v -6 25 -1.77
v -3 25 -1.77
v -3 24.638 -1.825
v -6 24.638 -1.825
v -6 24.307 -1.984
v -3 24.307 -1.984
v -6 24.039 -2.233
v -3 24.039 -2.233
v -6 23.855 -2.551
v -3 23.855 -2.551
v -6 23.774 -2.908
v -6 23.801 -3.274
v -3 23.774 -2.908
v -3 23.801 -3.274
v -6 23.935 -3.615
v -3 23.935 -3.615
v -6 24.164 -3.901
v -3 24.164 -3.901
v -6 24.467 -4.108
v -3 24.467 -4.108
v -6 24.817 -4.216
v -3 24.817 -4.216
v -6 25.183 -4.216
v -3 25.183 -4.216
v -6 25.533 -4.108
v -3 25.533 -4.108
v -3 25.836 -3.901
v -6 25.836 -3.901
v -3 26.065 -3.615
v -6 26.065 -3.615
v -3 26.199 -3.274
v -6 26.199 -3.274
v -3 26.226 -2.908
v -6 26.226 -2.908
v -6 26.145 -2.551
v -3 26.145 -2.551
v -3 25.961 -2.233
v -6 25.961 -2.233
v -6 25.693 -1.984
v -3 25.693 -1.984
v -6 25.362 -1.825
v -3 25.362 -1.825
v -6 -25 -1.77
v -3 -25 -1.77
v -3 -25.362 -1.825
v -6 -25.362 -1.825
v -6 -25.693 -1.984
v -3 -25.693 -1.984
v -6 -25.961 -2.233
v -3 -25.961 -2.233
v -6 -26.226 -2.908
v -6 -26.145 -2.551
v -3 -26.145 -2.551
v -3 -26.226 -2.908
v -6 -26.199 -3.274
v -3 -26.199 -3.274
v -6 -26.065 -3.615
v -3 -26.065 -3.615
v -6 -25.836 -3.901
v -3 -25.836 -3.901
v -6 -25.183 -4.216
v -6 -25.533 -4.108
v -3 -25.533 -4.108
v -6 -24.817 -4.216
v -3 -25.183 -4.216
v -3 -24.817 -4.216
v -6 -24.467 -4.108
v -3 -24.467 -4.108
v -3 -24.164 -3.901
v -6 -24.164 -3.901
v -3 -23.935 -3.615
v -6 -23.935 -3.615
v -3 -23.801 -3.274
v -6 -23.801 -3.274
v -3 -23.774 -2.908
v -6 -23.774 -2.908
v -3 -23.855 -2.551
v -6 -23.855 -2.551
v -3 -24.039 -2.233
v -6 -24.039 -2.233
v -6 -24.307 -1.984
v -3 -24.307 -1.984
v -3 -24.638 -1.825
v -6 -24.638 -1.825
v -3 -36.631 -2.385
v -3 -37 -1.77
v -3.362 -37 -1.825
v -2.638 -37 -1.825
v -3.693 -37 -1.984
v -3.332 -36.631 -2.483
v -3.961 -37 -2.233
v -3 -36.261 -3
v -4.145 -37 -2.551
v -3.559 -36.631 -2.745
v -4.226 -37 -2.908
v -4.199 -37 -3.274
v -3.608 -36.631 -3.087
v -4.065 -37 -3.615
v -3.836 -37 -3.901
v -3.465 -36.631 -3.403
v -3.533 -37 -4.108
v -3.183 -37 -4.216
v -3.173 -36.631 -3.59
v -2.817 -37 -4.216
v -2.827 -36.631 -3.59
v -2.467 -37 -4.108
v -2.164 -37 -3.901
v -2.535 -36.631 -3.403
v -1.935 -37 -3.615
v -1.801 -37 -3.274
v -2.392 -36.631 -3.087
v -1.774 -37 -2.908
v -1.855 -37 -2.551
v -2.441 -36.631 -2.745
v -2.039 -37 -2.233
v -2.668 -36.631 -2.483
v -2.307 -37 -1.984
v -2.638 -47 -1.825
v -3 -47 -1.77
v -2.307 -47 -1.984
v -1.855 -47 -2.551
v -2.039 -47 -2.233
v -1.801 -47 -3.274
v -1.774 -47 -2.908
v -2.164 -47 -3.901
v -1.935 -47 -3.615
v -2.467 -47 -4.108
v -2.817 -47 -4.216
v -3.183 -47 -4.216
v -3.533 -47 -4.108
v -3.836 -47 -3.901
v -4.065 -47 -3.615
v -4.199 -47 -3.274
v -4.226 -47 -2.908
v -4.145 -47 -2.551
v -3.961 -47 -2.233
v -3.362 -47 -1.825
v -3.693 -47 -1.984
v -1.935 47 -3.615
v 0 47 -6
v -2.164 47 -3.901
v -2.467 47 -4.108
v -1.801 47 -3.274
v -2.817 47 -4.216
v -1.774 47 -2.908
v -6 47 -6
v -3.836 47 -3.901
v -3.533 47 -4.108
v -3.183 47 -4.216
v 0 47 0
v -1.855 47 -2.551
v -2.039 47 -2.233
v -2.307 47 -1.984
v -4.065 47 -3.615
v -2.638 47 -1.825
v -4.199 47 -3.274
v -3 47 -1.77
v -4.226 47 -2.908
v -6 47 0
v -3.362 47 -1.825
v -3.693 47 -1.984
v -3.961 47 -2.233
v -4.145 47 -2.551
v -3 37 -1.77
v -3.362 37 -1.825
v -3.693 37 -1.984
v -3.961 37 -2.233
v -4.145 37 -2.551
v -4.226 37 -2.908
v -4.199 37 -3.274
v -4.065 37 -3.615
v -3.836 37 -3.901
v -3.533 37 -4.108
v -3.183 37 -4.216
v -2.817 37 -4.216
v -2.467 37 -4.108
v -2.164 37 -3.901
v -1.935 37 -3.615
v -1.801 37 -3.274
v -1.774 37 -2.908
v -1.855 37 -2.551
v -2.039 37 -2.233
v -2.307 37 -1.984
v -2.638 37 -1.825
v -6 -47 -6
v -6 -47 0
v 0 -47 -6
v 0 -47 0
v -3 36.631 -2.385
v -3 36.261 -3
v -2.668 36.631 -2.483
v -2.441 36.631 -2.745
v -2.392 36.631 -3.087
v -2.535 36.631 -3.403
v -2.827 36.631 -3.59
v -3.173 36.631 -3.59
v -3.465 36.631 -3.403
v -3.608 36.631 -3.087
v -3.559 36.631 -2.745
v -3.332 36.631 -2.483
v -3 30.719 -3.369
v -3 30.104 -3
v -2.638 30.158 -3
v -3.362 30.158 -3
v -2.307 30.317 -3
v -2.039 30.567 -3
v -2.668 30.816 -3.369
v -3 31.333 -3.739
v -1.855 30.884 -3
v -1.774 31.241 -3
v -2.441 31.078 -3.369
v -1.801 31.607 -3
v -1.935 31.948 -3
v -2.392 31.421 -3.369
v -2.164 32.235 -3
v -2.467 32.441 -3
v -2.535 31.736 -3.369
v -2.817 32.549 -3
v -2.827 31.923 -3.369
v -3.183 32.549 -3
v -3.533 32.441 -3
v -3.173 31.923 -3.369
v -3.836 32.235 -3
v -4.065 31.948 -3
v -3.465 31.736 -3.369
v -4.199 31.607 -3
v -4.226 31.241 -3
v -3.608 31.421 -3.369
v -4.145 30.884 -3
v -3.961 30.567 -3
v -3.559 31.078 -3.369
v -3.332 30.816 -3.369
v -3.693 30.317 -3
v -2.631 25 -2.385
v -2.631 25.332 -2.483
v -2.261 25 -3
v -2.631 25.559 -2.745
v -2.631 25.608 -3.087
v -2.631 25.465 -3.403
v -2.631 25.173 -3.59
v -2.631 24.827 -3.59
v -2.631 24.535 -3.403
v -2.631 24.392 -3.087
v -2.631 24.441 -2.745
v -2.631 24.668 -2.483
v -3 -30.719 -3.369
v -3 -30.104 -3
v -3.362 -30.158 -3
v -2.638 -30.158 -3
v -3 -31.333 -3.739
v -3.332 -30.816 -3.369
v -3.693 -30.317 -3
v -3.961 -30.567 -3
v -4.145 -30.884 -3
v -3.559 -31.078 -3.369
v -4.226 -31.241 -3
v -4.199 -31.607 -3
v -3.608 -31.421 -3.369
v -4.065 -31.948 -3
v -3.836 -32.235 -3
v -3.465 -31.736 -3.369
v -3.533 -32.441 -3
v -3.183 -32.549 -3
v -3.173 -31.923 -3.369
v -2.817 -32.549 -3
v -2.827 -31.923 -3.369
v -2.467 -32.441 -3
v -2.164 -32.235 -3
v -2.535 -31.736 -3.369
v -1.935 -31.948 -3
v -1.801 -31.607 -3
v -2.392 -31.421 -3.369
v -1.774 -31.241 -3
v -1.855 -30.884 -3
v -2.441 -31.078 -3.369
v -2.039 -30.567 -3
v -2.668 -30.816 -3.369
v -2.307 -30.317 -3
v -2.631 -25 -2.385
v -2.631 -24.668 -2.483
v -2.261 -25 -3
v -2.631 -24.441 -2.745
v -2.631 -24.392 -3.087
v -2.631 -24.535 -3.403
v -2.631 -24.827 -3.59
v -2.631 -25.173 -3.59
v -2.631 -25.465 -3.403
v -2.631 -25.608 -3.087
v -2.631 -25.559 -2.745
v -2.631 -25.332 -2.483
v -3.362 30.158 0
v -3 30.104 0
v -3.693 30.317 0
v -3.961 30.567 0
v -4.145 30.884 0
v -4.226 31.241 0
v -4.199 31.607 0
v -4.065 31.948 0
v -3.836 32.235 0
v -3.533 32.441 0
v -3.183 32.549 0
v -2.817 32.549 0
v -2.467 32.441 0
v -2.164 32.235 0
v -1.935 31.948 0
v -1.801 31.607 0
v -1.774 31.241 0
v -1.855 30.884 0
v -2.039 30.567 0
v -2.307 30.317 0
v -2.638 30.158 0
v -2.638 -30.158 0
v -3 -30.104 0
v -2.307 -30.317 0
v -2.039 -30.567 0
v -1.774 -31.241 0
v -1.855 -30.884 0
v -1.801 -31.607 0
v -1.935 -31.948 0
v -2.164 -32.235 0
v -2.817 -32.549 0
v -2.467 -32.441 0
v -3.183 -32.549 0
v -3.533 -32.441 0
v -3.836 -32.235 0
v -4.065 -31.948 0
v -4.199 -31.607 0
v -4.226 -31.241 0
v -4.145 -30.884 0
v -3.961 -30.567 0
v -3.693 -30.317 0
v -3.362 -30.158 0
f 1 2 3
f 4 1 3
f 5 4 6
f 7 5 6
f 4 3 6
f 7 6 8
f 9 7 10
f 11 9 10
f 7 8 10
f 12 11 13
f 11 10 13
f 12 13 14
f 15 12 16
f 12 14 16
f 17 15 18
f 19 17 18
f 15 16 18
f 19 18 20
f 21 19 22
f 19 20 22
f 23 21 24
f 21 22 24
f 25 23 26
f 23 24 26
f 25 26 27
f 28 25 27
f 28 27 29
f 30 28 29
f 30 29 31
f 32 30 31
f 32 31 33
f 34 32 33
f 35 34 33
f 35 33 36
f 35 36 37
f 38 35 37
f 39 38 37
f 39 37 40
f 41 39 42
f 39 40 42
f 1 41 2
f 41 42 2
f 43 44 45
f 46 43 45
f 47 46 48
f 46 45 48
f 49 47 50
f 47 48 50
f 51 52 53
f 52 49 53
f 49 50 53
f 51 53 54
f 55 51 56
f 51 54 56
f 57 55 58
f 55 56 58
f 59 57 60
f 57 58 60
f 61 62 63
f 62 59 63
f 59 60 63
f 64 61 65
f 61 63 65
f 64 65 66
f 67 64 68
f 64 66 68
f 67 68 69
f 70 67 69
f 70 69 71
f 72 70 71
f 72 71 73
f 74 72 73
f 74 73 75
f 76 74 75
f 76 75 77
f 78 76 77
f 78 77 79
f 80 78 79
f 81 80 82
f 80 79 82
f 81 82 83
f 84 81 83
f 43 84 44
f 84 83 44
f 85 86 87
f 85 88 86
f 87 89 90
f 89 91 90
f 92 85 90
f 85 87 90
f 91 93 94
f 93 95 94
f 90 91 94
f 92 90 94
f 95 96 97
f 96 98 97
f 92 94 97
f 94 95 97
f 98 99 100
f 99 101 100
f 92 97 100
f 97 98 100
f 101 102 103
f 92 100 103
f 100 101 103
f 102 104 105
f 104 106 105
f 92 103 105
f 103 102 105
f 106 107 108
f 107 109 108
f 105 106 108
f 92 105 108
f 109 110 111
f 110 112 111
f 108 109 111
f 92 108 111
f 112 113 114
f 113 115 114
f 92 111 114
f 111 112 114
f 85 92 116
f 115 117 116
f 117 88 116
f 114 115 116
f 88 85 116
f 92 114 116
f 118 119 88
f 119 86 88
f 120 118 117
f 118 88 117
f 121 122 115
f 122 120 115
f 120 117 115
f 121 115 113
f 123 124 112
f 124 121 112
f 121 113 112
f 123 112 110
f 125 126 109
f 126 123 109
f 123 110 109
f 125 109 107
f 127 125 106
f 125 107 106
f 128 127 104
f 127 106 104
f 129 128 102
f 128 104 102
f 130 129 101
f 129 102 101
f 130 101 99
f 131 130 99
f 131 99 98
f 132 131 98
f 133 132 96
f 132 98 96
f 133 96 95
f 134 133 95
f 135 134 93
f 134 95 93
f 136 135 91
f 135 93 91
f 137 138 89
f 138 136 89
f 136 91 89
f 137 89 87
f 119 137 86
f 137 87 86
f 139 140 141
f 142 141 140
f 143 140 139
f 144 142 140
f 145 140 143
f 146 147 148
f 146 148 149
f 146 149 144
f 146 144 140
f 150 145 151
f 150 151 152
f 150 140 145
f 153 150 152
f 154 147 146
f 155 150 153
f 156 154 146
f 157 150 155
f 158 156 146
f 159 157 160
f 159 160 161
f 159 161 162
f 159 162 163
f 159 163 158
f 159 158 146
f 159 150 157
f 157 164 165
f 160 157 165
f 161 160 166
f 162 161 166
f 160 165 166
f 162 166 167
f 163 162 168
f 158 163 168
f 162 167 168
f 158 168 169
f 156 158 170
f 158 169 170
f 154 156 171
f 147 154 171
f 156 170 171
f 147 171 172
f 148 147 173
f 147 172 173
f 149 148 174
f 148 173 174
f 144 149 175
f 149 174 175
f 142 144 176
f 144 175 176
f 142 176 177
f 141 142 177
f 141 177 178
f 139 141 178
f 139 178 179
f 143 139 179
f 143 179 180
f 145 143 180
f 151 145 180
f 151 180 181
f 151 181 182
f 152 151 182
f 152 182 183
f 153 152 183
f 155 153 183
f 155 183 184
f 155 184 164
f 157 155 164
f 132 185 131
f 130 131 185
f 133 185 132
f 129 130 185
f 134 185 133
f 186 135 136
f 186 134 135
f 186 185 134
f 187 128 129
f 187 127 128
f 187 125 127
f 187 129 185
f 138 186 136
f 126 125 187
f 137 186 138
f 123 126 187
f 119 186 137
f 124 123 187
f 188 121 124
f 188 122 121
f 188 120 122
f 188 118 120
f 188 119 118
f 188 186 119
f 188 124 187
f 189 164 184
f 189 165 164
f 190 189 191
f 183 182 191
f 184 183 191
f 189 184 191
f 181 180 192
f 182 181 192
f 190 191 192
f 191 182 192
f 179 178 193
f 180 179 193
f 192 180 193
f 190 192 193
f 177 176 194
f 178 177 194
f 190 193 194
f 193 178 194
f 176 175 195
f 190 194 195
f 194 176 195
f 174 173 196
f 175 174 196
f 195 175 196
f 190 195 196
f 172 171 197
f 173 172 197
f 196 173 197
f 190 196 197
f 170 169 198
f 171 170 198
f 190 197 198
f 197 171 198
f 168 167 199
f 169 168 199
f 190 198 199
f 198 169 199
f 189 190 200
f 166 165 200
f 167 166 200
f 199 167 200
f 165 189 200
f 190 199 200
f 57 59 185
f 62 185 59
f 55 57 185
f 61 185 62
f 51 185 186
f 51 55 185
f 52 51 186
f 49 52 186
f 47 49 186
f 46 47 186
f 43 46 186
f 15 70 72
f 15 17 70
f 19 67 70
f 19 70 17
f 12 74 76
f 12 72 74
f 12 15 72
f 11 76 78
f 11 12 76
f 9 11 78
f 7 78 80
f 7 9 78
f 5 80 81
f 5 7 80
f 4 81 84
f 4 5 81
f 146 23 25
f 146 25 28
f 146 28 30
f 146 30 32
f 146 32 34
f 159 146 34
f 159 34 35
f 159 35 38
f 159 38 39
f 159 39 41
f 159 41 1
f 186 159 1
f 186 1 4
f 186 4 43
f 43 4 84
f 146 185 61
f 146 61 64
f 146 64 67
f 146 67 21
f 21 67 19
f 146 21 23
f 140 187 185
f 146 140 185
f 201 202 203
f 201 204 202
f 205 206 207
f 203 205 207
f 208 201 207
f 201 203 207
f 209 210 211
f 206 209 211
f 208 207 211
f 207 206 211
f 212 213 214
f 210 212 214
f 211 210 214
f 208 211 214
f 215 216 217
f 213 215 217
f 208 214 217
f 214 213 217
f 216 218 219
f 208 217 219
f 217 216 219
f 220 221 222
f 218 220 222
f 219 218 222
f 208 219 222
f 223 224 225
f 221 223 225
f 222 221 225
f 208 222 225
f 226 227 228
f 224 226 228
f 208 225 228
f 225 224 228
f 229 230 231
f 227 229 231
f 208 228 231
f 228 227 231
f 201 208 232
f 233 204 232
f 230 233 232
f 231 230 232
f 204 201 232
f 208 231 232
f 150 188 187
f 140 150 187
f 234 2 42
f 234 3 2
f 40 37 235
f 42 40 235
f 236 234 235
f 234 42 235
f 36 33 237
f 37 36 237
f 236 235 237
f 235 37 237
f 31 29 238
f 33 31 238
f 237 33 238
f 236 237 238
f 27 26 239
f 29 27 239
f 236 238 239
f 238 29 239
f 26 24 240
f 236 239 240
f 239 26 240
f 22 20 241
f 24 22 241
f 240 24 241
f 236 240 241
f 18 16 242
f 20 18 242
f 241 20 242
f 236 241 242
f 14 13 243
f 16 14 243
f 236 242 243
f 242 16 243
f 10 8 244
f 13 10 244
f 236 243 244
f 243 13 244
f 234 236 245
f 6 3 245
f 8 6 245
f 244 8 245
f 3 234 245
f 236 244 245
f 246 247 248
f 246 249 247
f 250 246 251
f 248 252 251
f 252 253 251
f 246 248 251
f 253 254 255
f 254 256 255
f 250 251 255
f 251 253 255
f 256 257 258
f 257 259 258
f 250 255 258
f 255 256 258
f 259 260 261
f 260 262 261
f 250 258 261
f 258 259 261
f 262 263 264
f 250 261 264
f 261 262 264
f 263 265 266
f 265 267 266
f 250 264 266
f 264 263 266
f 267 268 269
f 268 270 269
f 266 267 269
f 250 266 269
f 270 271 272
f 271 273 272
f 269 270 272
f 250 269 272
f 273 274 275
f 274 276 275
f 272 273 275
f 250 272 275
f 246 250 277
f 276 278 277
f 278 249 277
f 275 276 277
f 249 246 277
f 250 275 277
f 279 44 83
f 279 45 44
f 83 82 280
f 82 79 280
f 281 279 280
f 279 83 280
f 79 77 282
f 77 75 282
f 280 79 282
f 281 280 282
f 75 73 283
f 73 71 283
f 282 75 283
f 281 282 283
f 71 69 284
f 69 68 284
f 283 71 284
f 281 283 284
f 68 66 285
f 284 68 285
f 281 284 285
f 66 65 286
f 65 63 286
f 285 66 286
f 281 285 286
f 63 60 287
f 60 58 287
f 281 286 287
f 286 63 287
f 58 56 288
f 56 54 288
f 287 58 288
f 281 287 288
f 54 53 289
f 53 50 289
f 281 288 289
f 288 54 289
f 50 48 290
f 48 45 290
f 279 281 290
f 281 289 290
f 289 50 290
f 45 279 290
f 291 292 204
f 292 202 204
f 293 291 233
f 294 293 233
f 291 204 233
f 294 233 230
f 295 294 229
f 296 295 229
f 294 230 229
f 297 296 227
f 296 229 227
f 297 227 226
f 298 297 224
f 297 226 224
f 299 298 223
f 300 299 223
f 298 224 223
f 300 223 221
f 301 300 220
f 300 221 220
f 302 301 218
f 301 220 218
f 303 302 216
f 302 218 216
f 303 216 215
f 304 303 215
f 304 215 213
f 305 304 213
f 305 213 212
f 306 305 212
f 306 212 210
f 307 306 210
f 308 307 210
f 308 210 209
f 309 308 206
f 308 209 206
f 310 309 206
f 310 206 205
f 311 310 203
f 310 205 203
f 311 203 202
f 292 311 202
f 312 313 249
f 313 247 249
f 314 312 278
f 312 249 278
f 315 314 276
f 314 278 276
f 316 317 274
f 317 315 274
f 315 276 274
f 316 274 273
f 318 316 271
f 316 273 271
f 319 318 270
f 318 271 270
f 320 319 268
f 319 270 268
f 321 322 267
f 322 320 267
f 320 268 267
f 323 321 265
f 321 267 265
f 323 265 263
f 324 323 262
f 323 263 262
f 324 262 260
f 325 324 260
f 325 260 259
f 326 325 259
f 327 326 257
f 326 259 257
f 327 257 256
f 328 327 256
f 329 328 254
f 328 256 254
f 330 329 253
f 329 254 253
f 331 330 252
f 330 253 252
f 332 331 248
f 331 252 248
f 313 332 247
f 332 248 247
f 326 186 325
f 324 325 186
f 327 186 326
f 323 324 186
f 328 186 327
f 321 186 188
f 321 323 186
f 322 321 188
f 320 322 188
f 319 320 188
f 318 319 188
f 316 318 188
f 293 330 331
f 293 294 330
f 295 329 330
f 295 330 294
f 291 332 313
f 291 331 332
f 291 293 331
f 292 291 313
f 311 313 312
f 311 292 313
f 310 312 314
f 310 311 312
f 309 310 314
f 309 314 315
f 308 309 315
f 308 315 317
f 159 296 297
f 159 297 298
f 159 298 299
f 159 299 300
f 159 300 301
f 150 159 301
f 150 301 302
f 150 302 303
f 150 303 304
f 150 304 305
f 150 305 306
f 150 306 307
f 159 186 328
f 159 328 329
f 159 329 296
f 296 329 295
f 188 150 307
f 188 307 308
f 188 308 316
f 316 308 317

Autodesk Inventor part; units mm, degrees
ref_plane "YZ Plane" through (0, 0, 0) normal (1, 0, 0) x (0, 1, 0)
ref_plane "XZ Plane" through (0, 0, 0) normal (0, 1, 0) x (-1, 0, 0)
ref_plane "XY Plane" through (0, 0, 0) normal (0, 0, 1) x (1, 0, 0)
sketch "Sketch1" plane through (0, 0, 0) normal (0, 1, 0) x (-1, 0, 0)
  line L0 (0, 0) -> (6, 0)
  line L1 (6, 0) -> (6, -6)
  line L2 (6, -6) -> (0, -6)
  line L3 (0, -6) -> (0, 0)
  dimension "d0" = 6
extrude "Extrusion1" add sketch "Sketch1" along normal blind 47
sketch "Sketch2" plane through (0, 47, 0) normal (0, 1, 0) x (1, 0, 0)
  line L0 (0, 6) -> (-6, 6) projected
  line L1 (0, 0) -> (0, 6) projected
  point P0 (-3, 3)
  point P1 (-3, 6)
  point P2 (0, 3)
  point P3 (-3, 6)
hole "Hole1" at (-3, 47, -3) direction (0, -1, 0) diameter 2.459 depth 10 tip angle 118 thread size "M3x0.5" class "6H" standard "ANSI Metric M Profile"
sketch "Sketch3" plane through (-6, 47, 0) normal (0, 0, 1) x (1, 0, 0)
  line L0 (0, -47) -> (0, 0) projected
  line L1 (6, -47) -> (6, 0) projected
  line L2 (0, 0) -> (6, 0) projected
  point P0 (3, -47)
  point P1 (3, -15.6667)
  point P2 (0, -94)
  point P3 (6, -94)
  dimension "d17" = 6
  dimension "d18" = 3
  dimension "d19" = 15.6667
  dimension "d20" = 31.3333
  dimension "d21" = 47
hole "Hole2" at (-3, 31.3333, 0) direction (0, 0, -1) diameter 2.459 depth 3 tip angle 118 thread size "M3x0.5" class "6H" standard "ANSI Metric M Profile"
sketch "Sketch5" plane through (-6, 0, -6) normal (-1, 0, 0) x (0, 0, 1)
  line L0 (0, 0) -> (6, 0) projected
  point P0 (3, 25)
  point P1 (3, 0)
  dimension "d29" = 25
hole "Hole3" at (-6, 25, -3) direction (1, 0, 0) diameter 2.459 depth 3 tip angle 118 thread size "M3x0.5" class "6H" standard "ANSI Metric M Profile"
mirror "Mirror2" about plane through (-3, 0, -3) normal (0, -1, 0) of "Extrusion1", "Hole1", "Hole2", "Hole3"
equation "\"d18\" = 0.5 * d17"
equation "\"d19\" = 0.333333 * d21"
equation "\"d20\" = 2 * d19"
properties part number "VerticalStrut"
